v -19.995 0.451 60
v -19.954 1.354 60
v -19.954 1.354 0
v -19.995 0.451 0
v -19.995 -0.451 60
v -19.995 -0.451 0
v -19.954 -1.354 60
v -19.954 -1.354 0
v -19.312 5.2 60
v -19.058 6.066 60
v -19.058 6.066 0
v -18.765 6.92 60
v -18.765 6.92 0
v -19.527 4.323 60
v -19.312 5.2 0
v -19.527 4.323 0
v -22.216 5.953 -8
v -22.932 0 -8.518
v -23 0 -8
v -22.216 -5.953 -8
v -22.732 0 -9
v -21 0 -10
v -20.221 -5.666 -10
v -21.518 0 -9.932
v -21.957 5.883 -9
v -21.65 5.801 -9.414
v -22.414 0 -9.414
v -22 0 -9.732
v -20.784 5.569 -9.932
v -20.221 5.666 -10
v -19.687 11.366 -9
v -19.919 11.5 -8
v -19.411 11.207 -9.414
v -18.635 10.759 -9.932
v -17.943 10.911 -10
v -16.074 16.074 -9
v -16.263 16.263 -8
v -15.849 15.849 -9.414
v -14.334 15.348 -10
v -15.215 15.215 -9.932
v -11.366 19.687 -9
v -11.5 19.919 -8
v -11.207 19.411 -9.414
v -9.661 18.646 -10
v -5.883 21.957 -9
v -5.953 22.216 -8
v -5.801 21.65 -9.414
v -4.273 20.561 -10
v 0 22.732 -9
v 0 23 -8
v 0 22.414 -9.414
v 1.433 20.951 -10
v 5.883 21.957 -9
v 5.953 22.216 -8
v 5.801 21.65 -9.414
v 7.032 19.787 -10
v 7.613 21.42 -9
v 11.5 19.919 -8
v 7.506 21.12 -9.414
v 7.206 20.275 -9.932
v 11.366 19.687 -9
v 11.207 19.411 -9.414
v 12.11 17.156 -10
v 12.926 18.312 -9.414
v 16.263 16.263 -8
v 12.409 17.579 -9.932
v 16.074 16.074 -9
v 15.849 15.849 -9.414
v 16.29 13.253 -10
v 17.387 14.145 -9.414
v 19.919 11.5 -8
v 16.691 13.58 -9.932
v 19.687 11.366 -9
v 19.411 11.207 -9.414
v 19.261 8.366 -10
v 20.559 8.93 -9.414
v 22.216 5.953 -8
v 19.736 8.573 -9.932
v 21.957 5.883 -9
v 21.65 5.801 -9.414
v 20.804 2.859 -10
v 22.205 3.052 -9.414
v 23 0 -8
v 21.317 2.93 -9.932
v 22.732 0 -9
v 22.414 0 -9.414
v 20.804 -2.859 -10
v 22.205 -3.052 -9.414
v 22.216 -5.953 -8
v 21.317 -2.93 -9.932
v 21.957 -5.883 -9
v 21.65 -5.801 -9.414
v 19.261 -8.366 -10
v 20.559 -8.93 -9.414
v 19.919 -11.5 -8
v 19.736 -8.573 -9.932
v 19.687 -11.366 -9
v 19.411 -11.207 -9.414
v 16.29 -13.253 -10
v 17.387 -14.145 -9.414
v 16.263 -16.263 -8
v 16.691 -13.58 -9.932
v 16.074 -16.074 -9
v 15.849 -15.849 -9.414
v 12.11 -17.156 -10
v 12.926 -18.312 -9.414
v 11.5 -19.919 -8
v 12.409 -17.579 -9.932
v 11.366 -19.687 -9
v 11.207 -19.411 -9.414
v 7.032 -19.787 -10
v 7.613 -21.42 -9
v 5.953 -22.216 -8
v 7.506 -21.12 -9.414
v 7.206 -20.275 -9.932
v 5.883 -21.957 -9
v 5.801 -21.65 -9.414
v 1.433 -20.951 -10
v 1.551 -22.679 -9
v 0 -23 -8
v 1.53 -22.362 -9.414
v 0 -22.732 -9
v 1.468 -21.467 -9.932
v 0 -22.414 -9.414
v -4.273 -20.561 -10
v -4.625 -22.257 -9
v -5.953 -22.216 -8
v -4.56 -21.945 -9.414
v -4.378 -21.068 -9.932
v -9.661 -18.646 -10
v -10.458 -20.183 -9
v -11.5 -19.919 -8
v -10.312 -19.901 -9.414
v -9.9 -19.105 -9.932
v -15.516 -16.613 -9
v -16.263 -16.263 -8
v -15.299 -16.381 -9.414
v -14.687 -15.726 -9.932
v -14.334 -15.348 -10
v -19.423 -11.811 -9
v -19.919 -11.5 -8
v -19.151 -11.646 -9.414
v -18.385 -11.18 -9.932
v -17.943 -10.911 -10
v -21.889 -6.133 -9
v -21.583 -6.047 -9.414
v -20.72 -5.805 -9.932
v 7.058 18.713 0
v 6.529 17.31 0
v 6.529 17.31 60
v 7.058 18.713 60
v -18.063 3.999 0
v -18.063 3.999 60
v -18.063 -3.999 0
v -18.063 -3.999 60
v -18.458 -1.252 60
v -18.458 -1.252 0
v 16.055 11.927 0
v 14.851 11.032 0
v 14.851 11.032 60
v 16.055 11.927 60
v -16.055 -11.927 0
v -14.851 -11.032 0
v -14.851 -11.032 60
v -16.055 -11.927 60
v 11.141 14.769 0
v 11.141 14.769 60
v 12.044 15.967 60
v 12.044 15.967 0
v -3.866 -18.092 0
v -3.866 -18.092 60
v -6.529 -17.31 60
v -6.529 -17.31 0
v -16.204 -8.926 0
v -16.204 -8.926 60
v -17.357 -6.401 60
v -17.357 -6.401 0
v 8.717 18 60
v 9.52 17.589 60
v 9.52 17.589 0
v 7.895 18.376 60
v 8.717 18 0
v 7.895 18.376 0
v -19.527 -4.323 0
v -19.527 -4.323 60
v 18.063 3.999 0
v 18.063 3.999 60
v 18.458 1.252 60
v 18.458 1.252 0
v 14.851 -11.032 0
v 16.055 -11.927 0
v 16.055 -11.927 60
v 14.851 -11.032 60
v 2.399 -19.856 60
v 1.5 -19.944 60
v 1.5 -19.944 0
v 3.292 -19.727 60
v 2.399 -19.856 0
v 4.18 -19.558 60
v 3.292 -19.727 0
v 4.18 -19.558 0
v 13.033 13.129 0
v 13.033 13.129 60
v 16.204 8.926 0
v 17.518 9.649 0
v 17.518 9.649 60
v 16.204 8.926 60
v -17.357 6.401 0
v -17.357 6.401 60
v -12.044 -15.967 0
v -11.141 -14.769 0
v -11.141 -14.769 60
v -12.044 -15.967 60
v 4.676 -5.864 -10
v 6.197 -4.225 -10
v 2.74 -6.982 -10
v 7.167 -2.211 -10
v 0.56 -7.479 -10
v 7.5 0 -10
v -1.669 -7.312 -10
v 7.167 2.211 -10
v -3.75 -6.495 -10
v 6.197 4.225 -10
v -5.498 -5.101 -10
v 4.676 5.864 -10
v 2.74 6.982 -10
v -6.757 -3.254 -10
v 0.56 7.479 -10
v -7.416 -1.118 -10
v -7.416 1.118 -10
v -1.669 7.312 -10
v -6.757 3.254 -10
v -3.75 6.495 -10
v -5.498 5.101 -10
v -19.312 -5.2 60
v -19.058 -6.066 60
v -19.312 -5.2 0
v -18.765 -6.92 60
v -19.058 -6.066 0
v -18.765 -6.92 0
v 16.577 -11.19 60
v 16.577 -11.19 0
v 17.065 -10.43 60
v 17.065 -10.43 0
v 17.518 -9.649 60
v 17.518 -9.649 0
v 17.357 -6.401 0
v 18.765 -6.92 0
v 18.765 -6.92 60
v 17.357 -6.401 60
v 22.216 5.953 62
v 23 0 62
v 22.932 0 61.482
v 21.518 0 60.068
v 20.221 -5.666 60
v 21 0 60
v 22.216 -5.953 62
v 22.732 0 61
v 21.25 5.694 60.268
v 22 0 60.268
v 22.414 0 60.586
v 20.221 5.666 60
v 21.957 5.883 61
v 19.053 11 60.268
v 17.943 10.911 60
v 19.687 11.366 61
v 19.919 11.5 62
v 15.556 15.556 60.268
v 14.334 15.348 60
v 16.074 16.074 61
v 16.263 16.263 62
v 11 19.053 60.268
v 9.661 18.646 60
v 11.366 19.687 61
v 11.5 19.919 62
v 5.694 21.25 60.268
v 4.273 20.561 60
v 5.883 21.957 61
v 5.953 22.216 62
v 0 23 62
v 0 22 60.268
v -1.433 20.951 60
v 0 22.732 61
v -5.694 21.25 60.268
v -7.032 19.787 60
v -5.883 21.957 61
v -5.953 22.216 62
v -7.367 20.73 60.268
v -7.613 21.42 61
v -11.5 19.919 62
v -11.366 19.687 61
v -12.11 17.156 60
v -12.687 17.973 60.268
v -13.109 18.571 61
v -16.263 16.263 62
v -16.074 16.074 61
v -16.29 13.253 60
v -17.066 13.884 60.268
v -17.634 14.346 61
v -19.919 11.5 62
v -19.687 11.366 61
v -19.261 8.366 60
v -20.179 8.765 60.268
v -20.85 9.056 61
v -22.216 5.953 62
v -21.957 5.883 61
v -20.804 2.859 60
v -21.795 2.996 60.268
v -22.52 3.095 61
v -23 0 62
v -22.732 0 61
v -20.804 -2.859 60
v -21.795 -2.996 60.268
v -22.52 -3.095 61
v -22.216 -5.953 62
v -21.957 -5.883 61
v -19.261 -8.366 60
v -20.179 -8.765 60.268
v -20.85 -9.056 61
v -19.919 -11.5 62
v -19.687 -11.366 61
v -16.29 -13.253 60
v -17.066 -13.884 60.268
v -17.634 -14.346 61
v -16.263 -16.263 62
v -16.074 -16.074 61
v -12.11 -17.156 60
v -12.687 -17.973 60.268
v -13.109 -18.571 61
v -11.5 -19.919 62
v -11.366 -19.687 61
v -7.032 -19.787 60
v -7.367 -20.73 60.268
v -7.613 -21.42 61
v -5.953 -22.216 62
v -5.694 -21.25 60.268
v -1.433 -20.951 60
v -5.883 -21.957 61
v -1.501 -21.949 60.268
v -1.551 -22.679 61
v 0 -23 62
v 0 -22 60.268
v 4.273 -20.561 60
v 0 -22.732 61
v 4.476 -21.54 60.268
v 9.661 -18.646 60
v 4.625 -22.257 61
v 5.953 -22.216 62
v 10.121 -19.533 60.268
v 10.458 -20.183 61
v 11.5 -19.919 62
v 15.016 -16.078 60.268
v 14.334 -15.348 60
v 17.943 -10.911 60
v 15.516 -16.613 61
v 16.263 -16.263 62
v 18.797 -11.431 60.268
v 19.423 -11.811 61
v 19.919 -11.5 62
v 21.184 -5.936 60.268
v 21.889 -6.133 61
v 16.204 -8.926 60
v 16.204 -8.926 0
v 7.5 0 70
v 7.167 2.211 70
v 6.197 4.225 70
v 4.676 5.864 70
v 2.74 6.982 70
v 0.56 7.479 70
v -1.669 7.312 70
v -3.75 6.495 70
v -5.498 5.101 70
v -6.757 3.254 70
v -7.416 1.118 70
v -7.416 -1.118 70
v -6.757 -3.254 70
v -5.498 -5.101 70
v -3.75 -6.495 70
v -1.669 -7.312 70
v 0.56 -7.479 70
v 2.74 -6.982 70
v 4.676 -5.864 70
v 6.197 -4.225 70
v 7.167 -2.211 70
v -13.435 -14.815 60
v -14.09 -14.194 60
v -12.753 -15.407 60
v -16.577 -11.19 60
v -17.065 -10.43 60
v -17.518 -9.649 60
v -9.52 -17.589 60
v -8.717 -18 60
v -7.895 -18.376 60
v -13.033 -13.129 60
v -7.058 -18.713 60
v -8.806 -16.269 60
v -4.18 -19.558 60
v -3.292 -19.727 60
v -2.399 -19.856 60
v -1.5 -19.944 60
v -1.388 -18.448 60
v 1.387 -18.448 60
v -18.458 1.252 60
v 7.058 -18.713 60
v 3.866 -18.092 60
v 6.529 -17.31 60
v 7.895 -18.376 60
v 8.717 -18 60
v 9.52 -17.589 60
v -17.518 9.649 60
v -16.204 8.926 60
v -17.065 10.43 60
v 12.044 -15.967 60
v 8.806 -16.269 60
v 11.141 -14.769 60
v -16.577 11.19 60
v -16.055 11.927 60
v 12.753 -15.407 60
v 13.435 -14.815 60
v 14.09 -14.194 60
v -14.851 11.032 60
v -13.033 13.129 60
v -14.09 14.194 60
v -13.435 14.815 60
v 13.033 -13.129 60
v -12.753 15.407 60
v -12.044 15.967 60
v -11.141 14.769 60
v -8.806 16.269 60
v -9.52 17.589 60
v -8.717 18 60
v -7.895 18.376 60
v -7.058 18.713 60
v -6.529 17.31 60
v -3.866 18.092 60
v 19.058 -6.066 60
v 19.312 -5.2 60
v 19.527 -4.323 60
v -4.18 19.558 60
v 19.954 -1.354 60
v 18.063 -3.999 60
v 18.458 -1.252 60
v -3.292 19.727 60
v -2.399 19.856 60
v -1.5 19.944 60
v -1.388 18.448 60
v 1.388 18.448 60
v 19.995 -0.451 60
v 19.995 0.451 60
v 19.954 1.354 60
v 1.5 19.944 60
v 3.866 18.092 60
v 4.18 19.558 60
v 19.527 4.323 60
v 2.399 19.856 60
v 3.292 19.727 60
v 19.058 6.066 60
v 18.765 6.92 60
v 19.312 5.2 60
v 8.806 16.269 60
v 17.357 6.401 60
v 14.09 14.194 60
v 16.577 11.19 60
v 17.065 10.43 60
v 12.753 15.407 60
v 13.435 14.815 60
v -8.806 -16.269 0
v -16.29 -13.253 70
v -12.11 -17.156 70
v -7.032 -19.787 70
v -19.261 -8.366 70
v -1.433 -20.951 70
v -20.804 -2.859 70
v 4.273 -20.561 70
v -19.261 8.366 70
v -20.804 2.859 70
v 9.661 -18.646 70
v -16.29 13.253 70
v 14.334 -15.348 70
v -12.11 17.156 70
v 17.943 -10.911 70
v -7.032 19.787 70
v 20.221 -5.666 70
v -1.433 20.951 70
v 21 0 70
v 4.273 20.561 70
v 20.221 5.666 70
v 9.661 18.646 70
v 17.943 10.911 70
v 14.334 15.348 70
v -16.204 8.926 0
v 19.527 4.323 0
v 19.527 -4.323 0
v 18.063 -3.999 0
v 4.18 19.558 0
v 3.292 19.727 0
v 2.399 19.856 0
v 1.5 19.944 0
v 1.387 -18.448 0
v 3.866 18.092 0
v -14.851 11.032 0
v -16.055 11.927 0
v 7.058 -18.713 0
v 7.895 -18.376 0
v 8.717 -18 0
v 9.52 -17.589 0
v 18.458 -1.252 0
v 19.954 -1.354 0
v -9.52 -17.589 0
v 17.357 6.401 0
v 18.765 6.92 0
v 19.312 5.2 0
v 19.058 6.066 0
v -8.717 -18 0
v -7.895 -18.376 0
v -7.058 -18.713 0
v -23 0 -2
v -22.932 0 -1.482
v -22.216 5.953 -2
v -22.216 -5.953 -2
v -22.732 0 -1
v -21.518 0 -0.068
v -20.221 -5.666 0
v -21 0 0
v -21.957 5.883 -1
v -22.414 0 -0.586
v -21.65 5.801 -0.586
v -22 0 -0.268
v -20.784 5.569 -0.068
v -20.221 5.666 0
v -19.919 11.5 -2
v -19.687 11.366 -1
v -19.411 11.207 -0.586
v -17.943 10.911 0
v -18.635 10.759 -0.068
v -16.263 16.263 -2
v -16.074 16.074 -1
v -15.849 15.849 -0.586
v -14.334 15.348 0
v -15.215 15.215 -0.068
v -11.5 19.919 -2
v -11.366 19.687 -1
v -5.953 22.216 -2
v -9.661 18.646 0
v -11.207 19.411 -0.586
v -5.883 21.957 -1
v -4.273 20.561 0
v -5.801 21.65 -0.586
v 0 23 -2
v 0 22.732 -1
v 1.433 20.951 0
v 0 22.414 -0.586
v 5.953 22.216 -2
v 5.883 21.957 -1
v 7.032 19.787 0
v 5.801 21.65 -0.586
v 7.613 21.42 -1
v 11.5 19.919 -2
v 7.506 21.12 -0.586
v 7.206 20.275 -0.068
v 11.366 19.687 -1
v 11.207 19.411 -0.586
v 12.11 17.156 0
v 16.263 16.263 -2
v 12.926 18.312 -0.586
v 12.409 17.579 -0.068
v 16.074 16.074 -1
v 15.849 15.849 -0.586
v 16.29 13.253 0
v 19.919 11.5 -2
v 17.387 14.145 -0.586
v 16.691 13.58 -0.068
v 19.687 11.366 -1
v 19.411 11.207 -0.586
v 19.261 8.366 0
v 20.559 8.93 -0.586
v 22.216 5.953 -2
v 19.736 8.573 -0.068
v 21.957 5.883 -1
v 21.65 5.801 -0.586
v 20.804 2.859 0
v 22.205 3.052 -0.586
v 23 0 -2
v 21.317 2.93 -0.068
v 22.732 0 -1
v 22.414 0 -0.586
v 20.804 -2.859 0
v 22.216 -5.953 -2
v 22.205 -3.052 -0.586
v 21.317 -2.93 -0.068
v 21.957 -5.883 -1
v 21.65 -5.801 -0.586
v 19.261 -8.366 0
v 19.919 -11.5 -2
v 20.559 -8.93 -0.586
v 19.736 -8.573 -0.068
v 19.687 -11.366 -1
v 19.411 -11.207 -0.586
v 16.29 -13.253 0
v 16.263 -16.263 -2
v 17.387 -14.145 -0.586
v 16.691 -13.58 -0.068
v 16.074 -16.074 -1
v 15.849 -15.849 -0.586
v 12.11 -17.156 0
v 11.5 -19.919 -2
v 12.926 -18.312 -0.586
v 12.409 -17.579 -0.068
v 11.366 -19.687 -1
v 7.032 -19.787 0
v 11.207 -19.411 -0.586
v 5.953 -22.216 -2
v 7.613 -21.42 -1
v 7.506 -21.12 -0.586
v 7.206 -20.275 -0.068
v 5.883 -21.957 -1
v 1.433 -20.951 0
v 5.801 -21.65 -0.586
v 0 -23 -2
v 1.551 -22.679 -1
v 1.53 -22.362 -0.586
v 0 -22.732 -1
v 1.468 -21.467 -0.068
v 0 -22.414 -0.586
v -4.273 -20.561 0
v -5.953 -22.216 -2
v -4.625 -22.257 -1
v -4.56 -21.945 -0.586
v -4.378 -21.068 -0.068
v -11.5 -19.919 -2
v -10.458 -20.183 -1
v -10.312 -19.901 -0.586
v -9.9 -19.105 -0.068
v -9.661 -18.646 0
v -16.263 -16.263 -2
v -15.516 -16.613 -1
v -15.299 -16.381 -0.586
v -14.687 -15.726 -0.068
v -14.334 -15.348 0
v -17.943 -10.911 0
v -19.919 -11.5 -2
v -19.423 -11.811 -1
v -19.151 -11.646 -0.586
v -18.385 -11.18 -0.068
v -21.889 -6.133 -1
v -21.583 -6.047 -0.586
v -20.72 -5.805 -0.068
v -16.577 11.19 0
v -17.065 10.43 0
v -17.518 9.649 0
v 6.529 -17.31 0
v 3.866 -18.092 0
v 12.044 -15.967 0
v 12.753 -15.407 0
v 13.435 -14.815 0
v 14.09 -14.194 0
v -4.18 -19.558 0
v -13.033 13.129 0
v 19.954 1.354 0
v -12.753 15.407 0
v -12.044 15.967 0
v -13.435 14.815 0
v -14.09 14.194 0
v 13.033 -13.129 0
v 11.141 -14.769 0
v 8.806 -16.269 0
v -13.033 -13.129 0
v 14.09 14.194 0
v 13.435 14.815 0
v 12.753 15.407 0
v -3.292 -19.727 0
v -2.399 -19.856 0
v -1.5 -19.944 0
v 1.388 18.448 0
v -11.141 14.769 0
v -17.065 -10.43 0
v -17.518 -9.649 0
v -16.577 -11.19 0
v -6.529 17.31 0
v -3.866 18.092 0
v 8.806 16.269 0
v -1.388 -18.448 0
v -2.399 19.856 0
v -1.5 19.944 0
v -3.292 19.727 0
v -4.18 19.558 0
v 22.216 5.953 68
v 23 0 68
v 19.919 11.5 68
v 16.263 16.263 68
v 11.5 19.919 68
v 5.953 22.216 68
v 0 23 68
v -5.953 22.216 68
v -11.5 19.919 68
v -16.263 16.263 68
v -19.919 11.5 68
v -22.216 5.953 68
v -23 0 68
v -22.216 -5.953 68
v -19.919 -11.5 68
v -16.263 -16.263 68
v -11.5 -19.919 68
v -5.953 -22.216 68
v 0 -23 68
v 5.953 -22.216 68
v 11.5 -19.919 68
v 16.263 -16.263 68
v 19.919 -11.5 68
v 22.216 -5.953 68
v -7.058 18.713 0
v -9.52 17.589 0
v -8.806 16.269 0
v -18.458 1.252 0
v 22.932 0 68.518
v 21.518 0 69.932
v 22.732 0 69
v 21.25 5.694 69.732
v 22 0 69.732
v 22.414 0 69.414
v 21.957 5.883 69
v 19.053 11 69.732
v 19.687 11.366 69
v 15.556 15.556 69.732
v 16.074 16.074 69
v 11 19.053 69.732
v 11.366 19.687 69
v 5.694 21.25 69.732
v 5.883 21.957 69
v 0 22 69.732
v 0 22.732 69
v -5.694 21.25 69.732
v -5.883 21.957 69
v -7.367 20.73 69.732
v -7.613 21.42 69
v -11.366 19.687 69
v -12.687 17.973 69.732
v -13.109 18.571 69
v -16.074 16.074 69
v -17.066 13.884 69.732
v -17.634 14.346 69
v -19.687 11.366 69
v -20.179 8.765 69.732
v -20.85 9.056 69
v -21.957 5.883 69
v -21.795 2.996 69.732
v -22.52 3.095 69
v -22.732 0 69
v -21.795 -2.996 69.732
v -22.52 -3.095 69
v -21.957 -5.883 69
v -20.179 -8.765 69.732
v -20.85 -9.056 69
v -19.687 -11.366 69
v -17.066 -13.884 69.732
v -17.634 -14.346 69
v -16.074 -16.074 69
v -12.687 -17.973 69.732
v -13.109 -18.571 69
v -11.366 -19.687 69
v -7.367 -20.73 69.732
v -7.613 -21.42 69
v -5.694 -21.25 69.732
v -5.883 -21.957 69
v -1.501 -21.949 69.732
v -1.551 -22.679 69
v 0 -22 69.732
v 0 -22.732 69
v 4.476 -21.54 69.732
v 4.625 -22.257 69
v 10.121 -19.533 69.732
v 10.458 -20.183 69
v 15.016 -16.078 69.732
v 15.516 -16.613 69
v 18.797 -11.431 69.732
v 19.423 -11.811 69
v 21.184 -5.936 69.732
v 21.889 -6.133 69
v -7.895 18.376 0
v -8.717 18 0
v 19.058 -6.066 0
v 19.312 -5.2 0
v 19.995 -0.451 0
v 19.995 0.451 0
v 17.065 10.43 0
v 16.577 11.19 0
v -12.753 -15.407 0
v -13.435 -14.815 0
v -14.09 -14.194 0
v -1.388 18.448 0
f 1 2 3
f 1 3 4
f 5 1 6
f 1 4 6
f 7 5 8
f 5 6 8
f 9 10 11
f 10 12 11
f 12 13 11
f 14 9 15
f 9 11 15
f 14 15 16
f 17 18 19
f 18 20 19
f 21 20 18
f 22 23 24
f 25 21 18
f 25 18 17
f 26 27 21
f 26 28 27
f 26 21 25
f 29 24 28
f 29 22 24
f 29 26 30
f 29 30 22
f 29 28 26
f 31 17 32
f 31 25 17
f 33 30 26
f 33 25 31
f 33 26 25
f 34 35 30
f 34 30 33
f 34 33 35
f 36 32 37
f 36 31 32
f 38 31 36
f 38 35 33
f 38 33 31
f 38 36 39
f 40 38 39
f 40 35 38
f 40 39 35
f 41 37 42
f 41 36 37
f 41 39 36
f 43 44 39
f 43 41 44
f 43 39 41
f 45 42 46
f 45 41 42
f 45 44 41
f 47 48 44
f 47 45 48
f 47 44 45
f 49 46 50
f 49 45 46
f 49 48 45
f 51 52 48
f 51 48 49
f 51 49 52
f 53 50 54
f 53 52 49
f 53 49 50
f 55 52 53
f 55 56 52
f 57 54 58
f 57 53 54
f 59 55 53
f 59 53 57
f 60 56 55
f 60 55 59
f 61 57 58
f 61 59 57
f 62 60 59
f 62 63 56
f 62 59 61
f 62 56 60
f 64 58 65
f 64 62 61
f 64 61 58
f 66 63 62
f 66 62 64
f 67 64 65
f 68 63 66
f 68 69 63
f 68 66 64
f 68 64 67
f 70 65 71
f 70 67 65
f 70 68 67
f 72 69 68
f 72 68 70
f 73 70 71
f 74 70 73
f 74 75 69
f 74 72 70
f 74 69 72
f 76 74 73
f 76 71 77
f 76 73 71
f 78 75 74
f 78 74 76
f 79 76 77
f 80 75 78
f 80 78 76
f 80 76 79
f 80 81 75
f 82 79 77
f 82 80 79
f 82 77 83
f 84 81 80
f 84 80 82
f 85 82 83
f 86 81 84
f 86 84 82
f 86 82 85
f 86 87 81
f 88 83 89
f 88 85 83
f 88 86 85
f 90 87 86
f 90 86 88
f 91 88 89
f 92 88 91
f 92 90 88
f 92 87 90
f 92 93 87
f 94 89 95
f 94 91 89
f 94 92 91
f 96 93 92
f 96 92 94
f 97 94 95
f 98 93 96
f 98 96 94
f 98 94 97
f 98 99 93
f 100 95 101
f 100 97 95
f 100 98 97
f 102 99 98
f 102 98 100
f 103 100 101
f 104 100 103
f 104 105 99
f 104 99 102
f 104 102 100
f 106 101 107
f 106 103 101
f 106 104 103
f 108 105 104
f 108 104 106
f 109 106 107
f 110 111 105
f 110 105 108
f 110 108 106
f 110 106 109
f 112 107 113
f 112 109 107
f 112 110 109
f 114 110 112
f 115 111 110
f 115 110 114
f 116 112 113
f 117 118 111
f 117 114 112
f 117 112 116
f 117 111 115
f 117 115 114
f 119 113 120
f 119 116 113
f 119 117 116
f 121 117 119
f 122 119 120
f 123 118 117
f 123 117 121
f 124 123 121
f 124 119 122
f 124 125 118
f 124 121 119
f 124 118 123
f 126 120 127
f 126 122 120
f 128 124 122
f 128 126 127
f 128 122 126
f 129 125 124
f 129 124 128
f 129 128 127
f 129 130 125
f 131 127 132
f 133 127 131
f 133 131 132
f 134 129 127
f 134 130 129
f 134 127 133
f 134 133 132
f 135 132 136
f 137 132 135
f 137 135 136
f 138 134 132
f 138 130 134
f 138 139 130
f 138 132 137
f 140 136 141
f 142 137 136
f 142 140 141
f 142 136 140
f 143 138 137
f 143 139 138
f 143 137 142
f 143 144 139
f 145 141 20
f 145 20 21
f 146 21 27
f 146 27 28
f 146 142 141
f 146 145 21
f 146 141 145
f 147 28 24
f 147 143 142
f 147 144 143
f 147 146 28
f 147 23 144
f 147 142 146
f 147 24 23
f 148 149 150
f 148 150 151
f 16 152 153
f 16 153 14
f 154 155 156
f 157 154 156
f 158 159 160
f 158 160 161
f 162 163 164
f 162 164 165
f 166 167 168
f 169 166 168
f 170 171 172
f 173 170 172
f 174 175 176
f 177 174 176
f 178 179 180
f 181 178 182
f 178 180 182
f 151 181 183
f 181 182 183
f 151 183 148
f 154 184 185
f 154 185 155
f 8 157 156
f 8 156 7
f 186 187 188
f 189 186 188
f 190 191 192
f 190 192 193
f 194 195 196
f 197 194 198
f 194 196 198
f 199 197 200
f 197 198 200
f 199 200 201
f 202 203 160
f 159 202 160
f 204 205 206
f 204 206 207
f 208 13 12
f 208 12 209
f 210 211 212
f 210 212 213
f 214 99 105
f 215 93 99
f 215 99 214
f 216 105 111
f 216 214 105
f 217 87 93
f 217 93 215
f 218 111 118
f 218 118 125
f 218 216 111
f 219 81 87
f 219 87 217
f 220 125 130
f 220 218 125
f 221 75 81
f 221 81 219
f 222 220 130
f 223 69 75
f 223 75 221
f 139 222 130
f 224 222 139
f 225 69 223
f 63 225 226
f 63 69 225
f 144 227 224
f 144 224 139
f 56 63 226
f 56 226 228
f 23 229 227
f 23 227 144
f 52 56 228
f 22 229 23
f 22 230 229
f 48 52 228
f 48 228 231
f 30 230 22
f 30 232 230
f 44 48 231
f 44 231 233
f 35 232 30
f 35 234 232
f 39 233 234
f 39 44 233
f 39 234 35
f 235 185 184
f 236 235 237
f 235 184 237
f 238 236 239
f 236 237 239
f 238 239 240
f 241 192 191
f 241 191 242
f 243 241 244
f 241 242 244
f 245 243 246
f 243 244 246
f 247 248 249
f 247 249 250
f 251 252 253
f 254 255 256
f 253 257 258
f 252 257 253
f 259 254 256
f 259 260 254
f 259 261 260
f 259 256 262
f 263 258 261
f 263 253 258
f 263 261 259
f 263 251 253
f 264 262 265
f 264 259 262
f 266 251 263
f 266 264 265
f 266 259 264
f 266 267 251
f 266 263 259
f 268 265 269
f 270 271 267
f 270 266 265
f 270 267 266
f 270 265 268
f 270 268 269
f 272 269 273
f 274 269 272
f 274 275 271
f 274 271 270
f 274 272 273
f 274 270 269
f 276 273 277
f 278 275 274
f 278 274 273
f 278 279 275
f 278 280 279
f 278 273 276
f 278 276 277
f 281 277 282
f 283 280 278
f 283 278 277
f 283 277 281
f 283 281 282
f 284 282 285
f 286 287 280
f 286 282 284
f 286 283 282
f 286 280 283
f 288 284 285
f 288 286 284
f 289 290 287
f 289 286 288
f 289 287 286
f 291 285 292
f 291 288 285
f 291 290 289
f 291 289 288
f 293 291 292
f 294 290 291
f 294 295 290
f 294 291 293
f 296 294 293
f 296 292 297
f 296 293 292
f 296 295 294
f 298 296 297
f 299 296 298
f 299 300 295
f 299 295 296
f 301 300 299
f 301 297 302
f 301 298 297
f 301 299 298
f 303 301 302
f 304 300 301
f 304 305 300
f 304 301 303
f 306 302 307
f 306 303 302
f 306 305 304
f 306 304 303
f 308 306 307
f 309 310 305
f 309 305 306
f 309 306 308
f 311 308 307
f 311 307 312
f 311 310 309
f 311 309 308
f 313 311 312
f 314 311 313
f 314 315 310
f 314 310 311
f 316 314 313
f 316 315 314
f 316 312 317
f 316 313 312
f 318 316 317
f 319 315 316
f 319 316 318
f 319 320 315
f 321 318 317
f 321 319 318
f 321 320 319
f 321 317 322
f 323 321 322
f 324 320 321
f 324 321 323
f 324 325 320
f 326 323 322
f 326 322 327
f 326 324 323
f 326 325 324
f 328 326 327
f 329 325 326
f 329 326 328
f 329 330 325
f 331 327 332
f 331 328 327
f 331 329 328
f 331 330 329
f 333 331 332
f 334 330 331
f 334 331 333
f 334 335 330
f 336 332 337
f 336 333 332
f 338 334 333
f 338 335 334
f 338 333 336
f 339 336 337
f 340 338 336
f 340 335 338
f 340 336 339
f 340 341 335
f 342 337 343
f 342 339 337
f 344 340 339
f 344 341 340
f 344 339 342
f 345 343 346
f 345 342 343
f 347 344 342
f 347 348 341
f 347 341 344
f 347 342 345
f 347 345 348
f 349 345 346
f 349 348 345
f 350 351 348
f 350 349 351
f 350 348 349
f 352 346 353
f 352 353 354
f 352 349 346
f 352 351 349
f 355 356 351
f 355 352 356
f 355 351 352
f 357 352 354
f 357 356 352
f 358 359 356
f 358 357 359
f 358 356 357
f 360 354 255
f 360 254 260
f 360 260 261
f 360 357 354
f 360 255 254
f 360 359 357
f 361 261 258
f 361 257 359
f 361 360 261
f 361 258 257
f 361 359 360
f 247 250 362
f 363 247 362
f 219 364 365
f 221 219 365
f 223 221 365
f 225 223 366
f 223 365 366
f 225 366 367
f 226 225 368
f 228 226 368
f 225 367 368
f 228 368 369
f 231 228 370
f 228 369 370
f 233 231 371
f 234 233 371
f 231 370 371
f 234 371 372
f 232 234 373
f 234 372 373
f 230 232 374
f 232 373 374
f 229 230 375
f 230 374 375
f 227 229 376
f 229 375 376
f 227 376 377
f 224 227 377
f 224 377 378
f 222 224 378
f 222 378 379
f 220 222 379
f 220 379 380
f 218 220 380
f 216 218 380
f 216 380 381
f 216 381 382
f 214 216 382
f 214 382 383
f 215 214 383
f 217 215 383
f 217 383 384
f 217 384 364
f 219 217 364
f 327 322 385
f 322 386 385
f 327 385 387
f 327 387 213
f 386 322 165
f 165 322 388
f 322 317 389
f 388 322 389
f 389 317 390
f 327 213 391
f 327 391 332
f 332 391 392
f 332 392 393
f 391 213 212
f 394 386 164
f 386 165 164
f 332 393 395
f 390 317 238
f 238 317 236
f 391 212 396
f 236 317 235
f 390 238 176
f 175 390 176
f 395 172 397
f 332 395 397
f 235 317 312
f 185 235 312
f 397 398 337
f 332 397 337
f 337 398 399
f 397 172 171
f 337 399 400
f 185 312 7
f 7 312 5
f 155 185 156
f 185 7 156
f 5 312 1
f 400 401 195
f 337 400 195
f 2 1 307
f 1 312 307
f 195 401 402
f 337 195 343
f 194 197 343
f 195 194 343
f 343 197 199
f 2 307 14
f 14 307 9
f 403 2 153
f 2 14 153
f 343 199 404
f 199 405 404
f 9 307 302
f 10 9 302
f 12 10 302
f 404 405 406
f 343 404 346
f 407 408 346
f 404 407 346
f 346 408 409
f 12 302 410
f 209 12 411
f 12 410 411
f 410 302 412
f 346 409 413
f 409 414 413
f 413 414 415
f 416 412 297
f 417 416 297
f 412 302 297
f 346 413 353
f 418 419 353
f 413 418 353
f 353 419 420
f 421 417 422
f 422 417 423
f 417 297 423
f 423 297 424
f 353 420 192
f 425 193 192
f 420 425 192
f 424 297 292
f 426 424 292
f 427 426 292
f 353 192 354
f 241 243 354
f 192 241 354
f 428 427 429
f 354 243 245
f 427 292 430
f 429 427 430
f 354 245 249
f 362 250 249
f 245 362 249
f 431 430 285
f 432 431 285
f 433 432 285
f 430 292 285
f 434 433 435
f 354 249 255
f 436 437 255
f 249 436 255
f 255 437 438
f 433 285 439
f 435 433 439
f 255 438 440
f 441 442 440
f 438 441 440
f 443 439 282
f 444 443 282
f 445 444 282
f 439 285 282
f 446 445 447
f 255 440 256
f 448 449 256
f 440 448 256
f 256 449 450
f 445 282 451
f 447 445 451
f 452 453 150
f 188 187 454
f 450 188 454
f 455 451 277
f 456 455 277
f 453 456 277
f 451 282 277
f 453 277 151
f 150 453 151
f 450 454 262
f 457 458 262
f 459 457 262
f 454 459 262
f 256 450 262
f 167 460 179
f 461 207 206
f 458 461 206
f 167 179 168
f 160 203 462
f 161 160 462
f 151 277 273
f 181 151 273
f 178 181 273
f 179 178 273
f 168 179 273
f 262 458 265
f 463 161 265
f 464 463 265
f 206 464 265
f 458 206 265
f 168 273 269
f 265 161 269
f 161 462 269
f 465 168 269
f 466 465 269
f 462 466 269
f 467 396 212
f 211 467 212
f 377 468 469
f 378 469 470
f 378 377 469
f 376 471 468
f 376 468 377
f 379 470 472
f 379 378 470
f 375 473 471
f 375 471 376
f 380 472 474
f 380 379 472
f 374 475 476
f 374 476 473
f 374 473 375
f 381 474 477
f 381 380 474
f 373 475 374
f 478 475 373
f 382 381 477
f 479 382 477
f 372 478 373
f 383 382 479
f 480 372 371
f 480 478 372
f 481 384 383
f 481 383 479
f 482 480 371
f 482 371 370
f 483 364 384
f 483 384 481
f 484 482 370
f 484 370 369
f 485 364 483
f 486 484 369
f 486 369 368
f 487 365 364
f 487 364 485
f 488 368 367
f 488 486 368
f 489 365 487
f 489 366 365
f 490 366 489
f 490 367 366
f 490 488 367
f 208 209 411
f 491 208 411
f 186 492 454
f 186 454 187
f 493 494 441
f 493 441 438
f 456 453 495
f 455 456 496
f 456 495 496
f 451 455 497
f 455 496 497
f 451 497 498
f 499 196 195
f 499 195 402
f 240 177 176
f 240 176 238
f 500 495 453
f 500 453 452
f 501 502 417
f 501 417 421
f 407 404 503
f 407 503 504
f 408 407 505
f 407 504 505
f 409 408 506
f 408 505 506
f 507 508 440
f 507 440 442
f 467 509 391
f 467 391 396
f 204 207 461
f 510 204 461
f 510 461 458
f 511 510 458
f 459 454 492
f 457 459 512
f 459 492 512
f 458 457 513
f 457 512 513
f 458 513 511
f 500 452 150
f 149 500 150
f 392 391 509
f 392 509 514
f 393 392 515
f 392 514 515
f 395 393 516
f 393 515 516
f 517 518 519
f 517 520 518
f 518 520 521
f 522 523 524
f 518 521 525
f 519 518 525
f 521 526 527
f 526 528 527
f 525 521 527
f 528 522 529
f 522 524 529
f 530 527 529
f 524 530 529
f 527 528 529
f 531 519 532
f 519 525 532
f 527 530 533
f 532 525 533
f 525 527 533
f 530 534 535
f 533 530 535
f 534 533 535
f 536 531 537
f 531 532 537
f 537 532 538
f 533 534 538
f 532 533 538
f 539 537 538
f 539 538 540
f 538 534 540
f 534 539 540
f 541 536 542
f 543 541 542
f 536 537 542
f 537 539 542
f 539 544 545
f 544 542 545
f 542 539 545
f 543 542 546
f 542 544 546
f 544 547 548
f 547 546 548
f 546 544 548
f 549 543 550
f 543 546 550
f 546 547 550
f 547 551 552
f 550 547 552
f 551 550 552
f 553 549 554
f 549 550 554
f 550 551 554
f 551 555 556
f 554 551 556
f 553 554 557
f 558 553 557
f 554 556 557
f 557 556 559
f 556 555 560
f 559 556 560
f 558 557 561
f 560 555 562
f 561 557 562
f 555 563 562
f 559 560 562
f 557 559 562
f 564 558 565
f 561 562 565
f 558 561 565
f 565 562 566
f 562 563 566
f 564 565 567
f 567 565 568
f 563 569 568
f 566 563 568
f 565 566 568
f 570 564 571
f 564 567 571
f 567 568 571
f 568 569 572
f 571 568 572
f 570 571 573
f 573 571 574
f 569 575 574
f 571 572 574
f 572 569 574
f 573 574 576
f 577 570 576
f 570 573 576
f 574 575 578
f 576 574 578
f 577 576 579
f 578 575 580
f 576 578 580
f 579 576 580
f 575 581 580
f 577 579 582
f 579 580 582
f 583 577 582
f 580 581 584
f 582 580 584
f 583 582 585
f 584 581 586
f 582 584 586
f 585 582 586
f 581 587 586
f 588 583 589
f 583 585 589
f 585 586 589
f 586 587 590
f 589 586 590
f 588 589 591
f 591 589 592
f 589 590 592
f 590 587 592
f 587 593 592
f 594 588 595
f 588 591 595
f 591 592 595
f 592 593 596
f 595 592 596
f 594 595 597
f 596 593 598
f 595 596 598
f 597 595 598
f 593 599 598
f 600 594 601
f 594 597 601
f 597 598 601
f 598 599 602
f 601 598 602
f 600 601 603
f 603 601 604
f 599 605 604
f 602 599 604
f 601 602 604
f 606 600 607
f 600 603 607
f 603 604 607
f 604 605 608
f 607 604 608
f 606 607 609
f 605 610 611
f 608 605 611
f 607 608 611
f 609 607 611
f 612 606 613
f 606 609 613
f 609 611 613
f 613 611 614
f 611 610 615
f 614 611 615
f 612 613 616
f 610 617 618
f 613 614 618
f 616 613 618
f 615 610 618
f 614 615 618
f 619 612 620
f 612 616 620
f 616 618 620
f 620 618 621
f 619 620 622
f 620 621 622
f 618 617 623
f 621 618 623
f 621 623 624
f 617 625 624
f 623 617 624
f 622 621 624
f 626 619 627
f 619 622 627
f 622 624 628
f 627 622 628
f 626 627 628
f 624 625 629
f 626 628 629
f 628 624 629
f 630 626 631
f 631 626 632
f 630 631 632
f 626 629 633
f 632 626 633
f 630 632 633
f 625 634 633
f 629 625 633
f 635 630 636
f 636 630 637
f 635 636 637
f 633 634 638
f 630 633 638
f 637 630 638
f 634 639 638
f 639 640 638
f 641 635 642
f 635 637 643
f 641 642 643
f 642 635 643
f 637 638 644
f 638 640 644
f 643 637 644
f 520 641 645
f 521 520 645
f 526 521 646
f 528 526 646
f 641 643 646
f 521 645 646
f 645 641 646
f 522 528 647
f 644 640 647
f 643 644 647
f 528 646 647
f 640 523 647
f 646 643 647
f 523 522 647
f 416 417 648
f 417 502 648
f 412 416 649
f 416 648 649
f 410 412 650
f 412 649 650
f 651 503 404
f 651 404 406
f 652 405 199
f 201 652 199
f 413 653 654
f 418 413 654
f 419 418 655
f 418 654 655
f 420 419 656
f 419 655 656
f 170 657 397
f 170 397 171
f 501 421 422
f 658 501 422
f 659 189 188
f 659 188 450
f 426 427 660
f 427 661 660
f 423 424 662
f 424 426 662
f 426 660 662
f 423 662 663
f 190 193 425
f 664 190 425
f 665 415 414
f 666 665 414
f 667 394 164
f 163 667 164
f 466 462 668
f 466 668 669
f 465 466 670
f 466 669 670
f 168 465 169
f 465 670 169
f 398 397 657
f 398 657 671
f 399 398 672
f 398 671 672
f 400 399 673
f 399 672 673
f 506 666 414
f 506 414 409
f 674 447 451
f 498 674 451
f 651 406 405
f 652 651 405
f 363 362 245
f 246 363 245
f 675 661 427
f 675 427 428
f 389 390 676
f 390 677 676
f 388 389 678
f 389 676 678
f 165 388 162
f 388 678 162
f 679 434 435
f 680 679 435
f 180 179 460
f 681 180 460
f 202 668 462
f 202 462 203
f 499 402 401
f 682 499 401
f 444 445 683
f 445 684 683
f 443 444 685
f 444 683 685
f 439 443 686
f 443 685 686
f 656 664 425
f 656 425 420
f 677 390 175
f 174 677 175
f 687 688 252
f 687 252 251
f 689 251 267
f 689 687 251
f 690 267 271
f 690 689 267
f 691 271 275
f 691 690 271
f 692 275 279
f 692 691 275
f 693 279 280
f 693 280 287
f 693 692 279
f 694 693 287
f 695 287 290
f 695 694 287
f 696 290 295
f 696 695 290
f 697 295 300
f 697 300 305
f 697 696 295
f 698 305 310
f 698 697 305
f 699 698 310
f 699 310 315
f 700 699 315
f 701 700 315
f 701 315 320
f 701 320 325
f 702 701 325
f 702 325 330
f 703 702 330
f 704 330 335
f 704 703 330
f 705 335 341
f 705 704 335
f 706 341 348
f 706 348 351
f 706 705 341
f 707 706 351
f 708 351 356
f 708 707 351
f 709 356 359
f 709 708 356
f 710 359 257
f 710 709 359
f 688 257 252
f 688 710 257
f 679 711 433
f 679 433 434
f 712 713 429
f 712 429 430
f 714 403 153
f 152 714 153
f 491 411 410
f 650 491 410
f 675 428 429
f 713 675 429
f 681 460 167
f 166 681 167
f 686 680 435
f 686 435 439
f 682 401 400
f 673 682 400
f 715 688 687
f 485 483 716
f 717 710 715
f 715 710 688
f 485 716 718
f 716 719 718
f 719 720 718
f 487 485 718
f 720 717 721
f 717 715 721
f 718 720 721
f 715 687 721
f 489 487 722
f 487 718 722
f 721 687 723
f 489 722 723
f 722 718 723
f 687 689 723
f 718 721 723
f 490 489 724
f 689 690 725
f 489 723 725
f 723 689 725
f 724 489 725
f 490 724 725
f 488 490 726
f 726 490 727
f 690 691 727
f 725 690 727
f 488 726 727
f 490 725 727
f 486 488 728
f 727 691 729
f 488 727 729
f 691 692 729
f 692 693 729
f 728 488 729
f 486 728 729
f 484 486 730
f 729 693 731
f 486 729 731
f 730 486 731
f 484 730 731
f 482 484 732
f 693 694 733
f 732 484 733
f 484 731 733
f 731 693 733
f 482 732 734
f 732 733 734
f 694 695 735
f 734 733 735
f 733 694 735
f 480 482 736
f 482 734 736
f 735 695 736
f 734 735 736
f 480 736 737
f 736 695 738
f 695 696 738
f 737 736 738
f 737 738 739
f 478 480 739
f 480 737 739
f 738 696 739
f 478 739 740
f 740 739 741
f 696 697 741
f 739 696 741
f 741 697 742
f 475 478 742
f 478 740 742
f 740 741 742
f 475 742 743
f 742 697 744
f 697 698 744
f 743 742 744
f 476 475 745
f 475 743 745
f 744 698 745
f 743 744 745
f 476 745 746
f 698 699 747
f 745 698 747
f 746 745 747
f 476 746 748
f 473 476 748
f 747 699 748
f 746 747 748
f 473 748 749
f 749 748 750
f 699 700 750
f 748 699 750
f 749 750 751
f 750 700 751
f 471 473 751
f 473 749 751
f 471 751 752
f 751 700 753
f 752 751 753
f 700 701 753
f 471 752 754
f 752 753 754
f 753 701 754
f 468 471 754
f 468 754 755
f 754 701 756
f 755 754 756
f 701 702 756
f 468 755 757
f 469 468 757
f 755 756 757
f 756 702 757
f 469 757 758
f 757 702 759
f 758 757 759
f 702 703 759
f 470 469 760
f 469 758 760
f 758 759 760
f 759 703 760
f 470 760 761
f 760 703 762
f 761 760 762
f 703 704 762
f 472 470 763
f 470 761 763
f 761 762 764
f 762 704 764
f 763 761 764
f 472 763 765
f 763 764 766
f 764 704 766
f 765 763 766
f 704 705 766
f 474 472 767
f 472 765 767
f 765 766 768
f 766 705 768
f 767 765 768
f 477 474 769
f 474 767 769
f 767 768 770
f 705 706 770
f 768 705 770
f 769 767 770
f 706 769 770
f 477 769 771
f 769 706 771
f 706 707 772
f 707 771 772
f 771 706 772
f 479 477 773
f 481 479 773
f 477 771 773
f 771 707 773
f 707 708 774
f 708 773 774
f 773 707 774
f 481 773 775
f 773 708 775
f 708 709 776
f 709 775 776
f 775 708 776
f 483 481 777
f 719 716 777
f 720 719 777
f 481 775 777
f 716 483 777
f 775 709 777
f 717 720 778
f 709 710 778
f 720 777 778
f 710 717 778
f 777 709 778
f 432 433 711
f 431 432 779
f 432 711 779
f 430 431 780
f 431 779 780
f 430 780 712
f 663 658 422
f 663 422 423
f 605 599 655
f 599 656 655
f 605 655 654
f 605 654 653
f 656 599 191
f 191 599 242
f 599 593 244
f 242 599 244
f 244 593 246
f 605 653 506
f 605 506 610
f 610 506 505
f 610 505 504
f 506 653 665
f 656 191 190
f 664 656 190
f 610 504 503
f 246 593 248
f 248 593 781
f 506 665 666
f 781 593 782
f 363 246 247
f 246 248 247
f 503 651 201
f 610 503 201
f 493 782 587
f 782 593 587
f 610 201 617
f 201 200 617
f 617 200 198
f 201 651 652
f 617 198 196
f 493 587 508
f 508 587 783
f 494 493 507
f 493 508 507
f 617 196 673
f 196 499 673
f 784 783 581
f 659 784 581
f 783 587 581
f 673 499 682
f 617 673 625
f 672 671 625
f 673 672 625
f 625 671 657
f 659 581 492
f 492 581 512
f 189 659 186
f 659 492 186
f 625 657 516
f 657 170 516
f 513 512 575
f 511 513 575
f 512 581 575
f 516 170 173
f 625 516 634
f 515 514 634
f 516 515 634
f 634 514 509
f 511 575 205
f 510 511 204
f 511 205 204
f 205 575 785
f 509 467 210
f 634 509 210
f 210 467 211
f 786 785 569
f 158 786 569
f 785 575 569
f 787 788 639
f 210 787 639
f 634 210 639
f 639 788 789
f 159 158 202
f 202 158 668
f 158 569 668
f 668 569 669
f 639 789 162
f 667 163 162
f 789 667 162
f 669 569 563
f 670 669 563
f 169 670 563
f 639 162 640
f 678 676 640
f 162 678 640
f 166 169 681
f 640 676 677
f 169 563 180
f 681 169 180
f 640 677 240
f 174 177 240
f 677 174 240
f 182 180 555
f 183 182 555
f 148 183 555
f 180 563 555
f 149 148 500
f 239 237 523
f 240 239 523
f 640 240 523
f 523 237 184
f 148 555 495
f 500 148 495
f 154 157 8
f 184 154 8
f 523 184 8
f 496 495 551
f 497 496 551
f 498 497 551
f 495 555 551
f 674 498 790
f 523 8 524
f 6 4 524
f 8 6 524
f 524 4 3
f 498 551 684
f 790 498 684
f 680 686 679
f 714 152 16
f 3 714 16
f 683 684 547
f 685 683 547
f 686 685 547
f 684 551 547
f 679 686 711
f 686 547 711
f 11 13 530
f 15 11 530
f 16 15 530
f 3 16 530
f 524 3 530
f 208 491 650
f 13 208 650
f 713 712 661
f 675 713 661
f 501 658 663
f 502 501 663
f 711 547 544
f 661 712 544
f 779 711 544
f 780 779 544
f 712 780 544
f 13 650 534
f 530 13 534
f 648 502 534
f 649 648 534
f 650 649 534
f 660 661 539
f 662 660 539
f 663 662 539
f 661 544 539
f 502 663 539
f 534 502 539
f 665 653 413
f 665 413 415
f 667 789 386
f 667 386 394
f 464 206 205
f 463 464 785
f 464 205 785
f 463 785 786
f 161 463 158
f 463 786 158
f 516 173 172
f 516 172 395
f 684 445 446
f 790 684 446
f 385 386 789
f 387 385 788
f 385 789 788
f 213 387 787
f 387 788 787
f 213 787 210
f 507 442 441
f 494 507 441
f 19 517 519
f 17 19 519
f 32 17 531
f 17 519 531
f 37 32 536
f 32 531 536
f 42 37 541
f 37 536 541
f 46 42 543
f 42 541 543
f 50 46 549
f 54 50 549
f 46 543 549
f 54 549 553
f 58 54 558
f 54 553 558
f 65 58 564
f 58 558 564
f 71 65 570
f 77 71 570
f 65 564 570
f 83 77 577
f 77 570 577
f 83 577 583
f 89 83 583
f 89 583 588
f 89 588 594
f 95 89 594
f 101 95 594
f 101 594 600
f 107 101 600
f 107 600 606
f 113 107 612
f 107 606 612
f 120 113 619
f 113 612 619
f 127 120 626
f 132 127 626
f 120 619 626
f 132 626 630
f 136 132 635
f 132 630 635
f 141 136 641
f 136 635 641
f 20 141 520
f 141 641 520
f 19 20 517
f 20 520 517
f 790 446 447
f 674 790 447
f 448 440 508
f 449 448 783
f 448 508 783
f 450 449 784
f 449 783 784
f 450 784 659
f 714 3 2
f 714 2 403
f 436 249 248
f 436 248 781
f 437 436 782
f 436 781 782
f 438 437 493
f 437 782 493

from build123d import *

# Parameters (mm, degrees)
SKETCH1_R           = 20
BOSS_EXTRUDE1_DEPTH = 70
CUT_EXTRUDE1_DEPTH  = 71
CIRPATTERN1_COUNT   = 22
SKETCH3_R           = 23
BOSS_EXTRUDE2_DEPTH = 10
SKETCH5_R           = 23
BOSS_EXTRUDE3_DEPTH = 10
SKETCH6_R           = 7.5
CUT_EXTRUDE2_DEPTH  = 81
FILLET1_R           = 2


with BuildPart() as part:
    # Sketch1 → Boss-Extrude1 (new body)
    with BuildSketch(Plane.XY):
        Circle(SKETCH1_R)
    extrude(amount=BOSS_EXTRUDE1_DEPTH)

    # Sketch2 → Cut-Extrude1 (cut, through all)
    with BuildSketch(Plane.XY.offset(70)):
        with BuildLine():
            Line((-1.3875, 18.447895375), (1.3875, 18.447895375))
            Line((1.3875, 18.447895375), (1.5, 19.943670675))
            ThreePointArc((1.5, 19.943670675), (0, 20), (-1.5, 19.943670675))
            Line((-1.5, 19.943670675), (-1.3875, 18.447895375))
        make_face()
    cut_extrude1 = extrude(amount=-CUT_EXTRUDE1_DEPTH, mode=Mode.SUBTRACT)

    # CirPattern1: Cut-Extrude1 ×22 about axis
    cirpattern1_axis = Axis((0, 0, 0), (0, 0, 1))
    for i in range(1, CIRPATTERN1_COUNT):
        add(cut_extrude1.rotate(cirpattern1_axis, i * 360 / CIRPATTERN1_COUNT), mode=Mode.SUBTRACT)

    # Sketch3 → Boss-Extrude2 (add)
    with BuildSketch(Plane.XY.offset(70)):
        Circle(SKETCH3_R)
    extrude(amount=-BOSS_EXTRUDE2_DEPTH)

    # Sketch5 → Boss-Extrude3 (add)
    with BuildSketch(Plane(origin=(0, 0, 0), x_dir=(-1, 0, 0), z_dir=(0, 0, -1))):
        Circle(SKETCH5_R)
    extrude(amount=BOSS_EXTRUDE3_DEPTH)

    # Sketch6 → Cut-Extrude2 (cut, through all)
    with BuildSketch(Plane.XY.offset(70)):
        Circle(SKETCH6_R)
    extrude(amount=-CUT_EXTRUDE2_DEPTH, mode=Mode.SUBTRACT)

    # Fillet1
    fillet1_edges = [part.edges().sort_by_distance(p)[0] for p in [
        (-23, 0, 70),
        (-23, 0, 60),
        (23, 0, 0),
        (23, 0, -10),
    ]]
    fillet(fillet1_edges, radius=FILLET1_R)


solid = part.part
